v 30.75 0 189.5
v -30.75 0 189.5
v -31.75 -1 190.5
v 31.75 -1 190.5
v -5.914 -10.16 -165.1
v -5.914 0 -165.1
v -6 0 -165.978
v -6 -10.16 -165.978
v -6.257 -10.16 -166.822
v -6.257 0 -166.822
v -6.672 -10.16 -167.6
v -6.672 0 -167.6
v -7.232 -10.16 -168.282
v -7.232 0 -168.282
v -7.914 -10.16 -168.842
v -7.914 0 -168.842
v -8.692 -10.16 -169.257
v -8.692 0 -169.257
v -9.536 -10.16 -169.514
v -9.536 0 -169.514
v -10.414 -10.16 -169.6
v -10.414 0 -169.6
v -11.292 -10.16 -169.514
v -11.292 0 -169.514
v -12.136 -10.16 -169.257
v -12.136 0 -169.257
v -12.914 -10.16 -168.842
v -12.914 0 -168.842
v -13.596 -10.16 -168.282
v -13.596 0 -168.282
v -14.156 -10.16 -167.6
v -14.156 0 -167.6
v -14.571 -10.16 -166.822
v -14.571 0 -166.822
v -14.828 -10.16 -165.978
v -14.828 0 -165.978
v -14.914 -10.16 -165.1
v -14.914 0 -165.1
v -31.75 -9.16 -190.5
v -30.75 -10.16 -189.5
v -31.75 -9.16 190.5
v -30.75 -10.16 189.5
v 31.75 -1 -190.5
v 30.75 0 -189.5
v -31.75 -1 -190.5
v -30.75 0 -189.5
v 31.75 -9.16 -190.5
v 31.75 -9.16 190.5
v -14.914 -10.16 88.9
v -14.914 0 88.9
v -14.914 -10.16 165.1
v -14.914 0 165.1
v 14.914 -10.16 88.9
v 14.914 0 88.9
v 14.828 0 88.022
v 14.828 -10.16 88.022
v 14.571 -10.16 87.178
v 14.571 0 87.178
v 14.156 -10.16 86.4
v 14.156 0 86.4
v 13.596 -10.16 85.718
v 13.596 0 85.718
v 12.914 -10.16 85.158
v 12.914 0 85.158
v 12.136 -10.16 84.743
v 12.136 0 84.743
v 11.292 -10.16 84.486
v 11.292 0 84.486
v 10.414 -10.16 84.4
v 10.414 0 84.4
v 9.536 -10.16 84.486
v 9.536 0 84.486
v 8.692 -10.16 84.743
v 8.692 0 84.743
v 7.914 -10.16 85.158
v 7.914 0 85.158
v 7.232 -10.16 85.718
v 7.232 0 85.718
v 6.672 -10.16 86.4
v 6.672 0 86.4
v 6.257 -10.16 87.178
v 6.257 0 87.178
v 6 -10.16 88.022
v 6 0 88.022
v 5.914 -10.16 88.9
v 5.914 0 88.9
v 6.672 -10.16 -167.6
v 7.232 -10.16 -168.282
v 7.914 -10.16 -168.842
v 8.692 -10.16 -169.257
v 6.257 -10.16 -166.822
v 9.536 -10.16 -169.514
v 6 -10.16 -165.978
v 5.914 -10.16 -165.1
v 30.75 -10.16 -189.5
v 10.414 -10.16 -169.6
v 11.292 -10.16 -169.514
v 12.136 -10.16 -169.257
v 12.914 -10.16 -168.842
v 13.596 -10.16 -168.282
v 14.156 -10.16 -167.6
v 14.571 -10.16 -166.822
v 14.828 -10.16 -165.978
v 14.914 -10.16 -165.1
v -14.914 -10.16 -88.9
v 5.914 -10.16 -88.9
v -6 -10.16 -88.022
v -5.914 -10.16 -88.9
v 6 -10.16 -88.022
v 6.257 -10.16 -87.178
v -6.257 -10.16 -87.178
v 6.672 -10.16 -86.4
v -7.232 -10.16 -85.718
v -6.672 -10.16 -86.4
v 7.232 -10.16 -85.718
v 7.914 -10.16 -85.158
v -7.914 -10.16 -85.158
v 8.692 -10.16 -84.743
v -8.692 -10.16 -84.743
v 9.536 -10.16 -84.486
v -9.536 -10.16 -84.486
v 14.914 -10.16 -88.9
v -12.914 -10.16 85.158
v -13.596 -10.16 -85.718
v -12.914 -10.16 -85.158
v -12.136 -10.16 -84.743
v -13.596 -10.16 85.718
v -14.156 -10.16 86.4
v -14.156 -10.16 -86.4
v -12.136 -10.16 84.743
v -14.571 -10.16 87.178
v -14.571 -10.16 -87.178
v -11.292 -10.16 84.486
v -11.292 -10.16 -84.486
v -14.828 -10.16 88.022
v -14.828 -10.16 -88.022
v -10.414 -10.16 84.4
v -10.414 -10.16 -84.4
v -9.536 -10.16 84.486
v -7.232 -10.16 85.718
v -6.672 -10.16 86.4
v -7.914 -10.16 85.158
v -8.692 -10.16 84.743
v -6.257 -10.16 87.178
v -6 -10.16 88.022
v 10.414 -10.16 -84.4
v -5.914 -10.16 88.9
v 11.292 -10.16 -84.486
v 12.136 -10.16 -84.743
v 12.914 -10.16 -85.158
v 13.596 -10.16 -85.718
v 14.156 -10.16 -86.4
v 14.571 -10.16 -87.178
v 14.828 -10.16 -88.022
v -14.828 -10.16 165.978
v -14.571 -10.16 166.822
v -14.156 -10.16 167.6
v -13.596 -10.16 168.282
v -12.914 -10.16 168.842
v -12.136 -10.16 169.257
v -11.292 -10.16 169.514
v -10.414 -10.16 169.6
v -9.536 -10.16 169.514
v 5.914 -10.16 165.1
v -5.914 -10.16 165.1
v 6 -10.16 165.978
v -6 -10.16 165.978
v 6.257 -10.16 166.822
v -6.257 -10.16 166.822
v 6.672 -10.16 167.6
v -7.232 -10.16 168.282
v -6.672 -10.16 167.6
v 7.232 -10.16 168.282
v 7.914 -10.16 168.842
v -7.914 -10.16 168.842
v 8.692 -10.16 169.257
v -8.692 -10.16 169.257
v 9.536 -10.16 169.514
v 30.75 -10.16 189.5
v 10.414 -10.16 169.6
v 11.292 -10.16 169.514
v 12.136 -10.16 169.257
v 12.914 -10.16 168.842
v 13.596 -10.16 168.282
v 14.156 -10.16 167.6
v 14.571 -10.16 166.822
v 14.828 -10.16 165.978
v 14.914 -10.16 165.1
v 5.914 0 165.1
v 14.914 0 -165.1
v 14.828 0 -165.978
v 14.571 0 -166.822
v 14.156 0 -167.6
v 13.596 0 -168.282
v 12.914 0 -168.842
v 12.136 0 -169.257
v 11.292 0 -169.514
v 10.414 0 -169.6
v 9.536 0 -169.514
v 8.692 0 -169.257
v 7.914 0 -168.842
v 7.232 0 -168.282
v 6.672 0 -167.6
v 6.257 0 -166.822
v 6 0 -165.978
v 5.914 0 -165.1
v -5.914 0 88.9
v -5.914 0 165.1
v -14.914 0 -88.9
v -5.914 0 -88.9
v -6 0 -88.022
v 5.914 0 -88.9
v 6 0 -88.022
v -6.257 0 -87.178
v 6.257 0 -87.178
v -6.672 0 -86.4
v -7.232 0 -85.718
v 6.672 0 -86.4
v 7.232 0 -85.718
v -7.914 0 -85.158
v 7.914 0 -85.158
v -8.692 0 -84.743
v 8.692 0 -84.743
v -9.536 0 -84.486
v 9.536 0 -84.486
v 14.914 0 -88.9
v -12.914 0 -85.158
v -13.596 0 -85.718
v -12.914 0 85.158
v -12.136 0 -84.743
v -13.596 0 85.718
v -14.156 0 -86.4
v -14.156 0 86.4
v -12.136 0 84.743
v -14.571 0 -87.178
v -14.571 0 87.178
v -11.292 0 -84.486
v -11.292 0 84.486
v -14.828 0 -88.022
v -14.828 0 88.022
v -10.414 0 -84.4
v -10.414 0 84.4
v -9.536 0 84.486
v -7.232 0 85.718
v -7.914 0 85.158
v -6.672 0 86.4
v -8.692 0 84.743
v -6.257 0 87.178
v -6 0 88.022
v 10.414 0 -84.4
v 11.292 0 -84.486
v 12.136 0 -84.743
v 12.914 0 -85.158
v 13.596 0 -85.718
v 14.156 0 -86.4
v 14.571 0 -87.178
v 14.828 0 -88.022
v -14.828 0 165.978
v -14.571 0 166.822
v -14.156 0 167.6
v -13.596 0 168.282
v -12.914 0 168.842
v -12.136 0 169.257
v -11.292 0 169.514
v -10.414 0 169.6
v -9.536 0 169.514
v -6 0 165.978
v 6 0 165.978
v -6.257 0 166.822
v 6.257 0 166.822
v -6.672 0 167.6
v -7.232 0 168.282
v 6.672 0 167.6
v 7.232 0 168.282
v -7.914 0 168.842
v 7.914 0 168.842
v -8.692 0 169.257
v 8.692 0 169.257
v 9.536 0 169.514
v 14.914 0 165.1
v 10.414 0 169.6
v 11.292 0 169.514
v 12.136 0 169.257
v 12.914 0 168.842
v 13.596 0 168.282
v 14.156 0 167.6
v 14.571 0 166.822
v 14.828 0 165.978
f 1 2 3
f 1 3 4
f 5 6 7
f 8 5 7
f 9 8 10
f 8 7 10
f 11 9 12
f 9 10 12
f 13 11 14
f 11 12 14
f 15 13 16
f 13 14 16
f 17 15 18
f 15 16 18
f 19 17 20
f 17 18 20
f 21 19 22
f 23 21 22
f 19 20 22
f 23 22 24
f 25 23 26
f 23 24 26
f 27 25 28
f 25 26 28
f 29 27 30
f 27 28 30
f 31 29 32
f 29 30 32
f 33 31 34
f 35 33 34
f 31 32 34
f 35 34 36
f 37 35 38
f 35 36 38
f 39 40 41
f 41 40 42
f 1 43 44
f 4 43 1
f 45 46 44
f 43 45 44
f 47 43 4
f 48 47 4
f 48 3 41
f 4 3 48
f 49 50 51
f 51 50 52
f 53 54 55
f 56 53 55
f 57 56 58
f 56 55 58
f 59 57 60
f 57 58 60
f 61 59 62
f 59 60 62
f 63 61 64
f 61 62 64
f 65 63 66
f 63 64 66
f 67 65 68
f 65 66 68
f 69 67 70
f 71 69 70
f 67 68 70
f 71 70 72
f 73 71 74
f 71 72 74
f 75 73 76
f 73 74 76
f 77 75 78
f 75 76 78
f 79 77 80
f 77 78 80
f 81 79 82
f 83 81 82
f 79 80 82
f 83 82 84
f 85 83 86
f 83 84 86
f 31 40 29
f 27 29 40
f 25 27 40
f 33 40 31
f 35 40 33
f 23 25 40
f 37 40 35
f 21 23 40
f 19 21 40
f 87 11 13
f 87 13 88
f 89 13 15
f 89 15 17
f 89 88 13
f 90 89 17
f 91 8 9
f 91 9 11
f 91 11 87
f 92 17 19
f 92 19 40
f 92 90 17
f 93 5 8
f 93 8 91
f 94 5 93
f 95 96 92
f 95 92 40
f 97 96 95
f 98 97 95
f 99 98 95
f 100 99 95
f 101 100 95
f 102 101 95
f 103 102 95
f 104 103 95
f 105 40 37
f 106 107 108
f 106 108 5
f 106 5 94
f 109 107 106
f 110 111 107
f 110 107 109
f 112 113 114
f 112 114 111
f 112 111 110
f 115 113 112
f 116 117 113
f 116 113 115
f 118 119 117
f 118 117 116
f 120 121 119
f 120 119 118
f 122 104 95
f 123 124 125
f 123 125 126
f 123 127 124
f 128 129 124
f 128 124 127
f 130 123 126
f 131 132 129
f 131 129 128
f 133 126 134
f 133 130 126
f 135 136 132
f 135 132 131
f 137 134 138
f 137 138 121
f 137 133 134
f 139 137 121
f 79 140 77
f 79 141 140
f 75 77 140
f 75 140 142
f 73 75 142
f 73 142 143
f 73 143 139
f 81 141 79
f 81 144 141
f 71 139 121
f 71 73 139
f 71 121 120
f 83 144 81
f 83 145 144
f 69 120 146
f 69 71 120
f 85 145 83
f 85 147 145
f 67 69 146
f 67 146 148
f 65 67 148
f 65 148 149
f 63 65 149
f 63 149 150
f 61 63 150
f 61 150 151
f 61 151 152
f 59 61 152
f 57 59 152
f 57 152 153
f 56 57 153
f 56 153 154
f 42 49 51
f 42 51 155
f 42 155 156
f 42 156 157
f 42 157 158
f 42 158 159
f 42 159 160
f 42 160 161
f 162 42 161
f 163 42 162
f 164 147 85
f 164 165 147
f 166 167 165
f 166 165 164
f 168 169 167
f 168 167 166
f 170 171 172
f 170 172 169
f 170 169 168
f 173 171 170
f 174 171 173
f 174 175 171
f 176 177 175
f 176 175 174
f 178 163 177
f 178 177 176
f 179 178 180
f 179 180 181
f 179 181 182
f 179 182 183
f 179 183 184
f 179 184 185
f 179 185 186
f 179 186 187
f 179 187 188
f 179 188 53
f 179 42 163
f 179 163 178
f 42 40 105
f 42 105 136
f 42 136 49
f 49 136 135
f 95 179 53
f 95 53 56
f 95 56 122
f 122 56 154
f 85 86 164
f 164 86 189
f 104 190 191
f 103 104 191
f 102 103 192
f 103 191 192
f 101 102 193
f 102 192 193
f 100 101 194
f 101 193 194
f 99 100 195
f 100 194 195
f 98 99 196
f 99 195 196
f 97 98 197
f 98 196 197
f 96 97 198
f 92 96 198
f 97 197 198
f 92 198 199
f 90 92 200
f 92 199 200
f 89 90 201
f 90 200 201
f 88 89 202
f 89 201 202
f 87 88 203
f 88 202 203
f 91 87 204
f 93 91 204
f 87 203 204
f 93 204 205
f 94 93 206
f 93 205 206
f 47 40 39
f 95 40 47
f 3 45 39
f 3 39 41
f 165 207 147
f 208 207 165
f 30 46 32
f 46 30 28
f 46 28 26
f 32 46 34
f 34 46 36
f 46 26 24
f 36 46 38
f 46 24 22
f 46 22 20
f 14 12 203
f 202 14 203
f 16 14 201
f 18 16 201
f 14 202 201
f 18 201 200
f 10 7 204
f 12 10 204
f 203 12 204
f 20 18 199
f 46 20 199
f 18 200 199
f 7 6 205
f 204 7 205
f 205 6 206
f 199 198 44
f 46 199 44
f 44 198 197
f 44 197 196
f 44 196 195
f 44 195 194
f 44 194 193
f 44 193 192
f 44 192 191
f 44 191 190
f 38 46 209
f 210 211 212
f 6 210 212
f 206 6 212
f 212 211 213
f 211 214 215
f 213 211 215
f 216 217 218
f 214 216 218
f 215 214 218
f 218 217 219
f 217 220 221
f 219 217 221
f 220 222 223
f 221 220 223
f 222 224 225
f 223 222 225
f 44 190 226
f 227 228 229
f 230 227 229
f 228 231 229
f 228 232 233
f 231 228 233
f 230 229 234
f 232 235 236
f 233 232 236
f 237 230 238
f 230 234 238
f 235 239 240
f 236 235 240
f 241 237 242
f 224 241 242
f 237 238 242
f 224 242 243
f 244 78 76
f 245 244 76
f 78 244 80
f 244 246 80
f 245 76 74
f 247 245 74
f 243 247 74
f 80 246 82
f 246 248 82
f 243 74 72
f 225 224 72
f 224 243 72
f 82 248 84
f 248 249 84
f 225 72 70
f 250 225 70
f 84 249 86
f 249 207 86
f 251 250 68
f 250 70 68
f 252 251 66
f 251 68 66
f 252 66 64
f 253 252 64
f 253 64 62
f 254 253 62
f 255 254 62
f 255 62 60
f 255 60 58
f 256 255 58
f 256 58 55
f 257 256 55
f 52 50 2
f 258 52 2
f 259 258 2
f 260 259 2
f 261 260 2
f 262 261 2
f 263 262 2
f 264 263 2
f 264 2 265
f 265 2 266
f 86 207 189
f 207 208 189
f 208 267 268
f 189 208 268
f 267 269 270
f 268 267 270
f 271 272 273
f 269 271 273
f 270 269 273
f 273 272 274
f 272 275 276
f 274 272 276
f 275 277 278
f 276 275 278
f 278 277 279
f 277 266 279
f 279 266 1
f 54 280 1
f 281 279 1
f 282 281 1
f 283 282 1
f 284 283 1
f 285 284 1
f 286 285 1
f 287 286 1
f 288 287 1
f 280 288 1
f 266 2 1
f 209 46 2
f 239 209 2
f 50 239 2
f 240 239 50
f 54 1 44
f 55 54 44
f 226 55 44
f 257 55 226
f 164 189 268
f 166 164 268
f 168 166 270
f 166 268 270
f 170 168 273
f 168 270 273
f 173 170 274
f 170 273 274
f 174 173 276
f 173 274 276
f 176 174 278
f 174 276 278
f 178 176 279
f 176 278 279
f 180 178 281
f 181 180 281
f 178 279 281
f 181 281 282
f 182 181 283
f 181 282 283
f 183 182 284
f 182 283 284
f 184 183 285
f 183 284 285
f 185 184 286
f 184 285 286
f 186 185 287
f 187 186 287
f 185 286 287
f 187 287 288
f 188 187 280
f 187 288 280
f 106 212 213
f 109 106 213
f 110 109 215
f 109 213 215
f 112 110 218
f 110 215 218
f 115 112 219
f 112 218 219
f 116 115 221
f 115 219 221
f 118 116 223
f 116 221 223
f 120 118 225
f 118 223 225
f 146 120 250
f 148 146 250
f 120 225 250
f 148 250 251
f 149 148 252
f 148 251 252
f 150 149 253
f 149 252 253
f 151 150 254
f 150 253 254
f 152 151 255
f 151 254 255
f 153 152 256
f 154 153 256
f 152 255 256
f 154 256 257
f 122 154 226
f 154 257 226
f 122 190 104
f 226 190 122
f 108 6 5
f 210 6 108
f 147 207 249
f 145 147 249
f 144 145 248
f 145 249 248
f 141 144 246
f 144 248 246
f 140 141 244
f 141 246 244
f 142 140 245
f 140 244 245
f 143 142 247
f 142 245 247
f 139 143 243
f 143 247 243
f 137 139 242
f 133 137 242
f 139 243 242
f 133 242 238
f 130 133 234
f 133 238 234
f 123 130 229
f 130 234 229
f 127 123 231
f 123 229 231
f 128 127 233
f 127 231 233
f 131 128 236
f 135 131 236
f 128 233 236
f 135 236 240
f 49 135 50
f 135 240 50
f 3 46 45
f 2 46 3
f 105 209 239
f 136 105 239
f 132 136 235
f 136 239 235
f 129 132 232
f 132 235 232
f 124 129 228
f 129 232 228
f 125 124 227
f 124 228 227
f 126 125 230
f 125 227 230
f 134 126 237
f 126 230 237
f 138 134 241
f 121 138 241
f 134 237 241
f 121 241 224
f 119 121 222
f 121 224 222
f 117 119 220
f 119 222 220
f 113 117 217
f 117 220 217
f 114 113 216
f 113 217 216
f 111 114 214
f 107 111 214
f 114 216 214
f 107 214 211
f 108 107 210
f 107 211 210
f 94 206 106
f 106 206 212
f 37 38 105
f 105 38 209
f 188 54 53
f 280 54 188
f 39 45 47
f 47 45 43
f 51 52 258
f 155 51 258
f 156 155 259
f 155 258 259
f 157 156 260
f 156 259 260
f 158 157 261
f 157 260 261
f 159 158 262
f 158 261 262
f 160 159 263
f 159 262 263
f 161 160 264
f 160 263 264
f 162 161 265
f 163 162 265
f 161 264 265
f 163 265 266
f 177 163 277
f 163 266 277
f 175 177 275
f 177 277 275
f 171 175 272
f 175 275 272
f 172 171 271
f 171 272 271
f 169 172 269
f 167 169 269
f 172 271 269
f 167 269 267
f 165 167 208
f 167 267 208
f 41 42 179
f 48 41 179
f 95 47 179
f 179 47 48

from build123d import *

# Parameters (mm, degrees)
F0_W     = 63.5
F0_H     = 381
F1_DEPTH = 10.16
F2_W     = 9
F2_H     = 76.2
F3_DEPTH = 10.161
F4_SIZE  = 1


with BuildPart() as f1:
    # F0 (on Front) → F1 (new body)
    with BuildSketch(Plane.XZ):
        Rectangle(F0_W, F0_H)
    extrude(amount=F1_DEPTH)

    # F2 (on face) → F3 (cut, through all)
    with BuildSketch(Plane(origin=(0, 0, 0), x_dir=(-1, 0, 0), z_dir=(0, 1, 0))):
        with Locations((-10.414, -127)):
            Rectangle(F2_W, F2_H)
        with Locations((-10.414, 127)):
            Rectangle(F2_W, F2_H)
        with Locations((10.414, 127)):
            Rectangle(F2_W, F2_H)
        with BuildLine():
            Line((5.914, 165.1), (14.914, 165.1))
            ThreePointArc((14.914, 165.1), (10.414, 169.6), (5.914, 165.1))
        make_face()
        with BuildLine():
            ThreePointArc((-5.914, 165.1), (-10.414, 169.6), (-14.914, 165.1))
            Line((-14.914, 165.1), (-5.914, 165.1))
        make_face()
        with BuildLine():
            Line((-5.914, 88.9), (-14.914, 88.9))
            ThreePointArc((-14.914, 88.9), (-10.414, 84.4), (-5.914, 88.9))
        make_face()
        with BuildLine():
            ThreePointArc((5.914, 88.9), (10.414, 84.4), (14.914, 88.9))
            Line((14.914, 88.9), (5.914, 88.9))
        make_face()
        with BuildLine():
            Line((-14.914, -88.9), (-5.914, -88.9))
            ThreePointArc((-5.914, -88.9), (-10.414, -84.4), (-14.914, -88.9))
        make_face()
        with BuildLine():
            Line((5.914, -88.9), (14.914, -88.9))
            ThreePointArc((14.914, -88.9), (10.414, -84.4), (5.914, -88.9))
        make_face()
        with Locations((10.414, -127)):
            Rectangle(F2_W, F2_H)
        with BuildLine():
            ThreePointArc((5.914, -165.1), (10.414, -169.6), (14.914, -165.1))
            Line((14.914, -165.1), (5.914, -165.1))
        make_face()
        with BuildLine():
            ThreePointArc((-14.914, -165.1), (-10.414, -169.6), (-5.914, -165.1))
            Line((-5.914, -165.1), (-14.914, -165.1))
        make_face()
    extrude(amount=-F3_DEPTH, mode=Mode.SUBTRACT)

    # F4
    f4_edges = [f1.edges().sort_by_distance(p)[0] for p in [
        (-31.75, -10.16, 0),
        (31.75, -10.16, 0),
        (0, -10.16, 190.5),
        (0, -10.16, -190.5),
        (0, 0, 190.5),
        (-31.75, 0, 0),
        (0, 0, -190.5),
        (31.75, 0, 0),
    ]]
    chamfer(f4_edges, length=F4_SIZE)


solid = f1.part
